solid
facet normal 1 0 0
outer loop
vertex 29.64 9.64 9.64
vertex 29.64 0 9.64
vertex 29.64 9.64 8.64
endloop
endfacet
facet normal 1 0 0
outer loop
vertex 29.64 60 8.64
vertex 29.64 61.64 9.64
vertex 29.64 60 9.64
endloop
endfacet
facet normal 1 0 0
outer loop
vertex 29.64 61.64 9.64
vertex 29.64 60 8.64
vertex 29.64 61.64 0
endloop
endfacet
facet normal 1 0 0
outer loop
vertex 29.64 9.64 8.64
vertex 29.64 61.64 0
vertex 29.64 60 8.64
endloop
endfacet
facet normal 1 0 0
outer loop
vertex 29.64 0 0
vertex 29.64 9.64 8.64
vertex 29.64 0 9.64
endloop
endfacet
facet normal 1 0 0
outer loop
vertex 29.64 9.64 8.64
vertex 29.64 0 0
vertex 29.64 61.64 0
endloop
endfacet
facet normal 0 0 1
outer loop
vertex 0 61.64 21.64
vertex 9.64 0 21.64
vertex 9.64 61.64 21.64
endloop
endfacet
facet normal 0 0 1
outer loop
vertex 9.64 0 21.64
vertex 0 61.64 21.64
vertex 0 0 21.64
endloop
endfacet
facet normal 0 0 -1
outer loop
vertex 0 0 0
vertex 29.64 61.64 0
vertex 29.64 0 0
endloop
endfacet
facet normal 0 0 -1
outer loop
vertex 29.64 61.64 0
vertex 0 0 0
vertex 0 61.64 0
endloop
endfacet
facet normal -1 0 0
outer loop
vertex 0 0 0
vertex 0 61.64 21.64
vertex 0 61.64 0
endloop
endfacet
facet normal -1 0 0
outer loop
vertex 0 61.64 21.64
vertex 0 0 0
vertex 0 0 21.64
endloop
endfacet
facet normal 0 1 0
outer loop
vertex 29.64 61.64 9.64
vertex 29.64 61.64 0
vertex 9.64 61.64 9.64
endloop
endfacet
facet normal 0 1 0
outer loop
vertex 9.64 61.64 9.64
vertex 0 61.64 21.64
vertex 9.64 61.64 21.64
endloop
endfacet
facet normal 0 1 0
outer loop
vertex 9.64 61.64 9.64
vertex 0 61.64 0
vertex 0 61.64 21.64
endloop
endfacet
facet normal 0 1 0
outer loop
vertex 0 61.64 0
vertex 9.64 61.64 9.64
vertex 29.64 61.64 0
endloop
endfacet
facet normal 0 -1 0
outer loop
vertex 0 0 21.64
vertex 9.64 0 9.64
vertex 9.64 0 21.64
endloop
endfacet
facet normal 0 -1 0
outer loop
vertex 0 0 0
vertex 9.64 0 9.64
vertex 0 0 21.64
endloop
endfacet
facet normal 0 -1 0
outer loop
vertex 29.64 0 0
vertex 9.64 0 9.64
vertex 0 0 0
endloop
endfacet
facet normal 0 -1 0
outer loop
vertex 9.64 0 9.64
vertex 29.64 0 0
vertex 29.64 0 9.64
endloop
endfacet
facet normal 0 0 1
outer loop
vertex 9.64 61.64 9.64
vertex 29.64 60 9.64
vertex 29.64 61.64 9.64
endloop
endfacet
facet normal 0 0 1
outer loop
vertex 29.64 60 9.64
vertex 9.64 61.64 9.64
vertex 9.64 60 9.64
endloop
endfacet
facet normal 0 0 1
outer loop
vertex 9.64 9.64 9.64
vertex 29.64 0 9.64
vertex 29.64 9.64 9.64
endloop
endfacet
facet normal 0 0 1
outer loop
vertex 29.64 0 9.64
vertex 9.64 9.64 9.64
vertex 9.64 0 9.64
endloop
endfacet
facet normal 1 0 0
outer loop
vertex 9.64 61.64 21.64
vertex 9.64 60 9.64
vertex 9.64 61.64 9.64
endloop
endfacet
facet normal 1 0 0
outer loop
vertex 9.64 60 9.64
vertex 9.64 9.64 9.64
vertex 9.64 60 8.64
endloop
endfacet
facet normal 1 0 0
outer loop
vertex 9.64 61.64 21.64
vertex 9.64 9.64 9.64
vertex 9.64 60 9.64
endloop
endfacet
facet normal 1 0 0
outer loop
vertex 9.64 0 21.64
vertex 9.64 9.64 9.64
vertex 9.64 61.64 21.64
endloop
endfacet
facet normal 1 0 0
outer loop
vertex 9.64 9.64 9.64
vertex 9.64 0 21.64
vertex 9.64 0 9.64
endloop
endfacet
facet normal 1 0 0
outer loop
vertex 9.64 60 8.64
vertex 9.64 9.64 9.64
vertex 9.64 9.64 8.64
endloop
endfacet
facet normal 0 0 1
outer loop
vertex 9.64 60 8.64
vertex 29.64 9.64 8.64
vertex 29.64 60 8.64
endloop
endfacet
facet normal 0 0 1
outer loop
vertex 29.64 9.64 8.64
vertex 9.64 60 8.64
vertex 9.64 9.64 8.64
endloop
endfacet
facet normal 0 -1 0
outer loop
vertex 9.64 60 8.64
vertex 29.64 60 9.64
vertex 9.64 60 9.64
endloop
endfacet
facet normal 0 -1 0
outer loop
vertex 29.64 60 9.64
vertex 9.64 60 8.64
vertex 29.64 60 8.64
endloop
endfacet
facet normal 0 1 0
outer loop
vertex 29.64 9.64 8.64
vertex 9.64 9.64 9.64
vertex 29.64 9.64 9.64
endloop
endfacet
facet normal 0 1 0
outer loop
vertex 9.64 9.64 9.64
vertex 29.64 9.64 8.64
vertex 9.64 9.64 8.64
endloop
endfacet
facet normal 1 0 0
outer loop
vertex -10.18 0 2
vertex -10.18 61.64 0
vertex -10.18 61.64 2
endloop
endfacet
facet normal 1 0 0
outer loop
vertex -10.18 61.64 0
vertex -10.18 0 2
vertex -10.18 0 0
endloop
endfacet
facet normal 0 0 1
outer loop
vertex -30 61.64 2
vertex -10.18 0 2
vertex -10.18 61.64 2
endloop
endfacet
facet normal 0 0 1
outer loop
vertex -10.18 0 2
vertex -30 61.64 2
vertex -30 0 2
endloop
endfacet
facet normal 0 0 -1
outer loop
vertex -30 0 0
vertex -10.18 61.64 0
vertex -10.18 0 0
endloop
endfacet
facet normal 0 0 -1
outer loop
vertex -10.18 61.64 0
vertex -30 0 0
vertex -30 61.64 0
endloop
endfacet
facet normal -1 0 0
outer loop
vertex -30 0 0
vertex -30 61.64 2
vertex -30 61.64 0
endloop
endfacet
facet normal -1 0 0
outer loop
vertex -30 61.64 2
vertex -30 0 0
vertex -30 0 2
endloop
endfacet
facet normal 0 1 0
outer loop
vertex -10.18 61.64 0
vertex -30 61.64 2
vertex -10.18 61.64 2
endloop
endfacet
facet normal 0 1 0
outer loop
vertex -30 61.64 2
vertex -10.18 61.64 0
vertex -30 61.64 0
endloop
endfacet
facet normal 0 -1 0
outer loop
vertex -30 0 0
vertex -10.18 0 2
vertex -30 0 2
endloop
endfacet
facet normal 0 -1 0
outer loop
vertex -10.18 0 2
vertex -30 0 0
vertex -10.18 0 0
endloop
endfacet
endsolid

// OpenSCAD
bias = 0.18;

module case() {
    difference () {
        difference () {
            translate([bias, bias, bias])
                cube([30 - 2 * bias, 62 - 2 * bias, 22 - 2 * bias]);
                
            translate([10 - bias, 0 - bias, 10 - bias])
                cube([20 + bias, 62 + 2 * bias, 12 + bias]);
        };
        
        translate([10 - bias, 10 - bias, 9 - bias])
            cube([20 + 2 * bias, 50 + 2 * bias, 1 + 2 * bias]);
    };
}

translate([-bias, -bias, -bias])
    case();

translate([-30, 0, 0])
    cube([20 - bias, 62 - 2 * bias, 2]);
